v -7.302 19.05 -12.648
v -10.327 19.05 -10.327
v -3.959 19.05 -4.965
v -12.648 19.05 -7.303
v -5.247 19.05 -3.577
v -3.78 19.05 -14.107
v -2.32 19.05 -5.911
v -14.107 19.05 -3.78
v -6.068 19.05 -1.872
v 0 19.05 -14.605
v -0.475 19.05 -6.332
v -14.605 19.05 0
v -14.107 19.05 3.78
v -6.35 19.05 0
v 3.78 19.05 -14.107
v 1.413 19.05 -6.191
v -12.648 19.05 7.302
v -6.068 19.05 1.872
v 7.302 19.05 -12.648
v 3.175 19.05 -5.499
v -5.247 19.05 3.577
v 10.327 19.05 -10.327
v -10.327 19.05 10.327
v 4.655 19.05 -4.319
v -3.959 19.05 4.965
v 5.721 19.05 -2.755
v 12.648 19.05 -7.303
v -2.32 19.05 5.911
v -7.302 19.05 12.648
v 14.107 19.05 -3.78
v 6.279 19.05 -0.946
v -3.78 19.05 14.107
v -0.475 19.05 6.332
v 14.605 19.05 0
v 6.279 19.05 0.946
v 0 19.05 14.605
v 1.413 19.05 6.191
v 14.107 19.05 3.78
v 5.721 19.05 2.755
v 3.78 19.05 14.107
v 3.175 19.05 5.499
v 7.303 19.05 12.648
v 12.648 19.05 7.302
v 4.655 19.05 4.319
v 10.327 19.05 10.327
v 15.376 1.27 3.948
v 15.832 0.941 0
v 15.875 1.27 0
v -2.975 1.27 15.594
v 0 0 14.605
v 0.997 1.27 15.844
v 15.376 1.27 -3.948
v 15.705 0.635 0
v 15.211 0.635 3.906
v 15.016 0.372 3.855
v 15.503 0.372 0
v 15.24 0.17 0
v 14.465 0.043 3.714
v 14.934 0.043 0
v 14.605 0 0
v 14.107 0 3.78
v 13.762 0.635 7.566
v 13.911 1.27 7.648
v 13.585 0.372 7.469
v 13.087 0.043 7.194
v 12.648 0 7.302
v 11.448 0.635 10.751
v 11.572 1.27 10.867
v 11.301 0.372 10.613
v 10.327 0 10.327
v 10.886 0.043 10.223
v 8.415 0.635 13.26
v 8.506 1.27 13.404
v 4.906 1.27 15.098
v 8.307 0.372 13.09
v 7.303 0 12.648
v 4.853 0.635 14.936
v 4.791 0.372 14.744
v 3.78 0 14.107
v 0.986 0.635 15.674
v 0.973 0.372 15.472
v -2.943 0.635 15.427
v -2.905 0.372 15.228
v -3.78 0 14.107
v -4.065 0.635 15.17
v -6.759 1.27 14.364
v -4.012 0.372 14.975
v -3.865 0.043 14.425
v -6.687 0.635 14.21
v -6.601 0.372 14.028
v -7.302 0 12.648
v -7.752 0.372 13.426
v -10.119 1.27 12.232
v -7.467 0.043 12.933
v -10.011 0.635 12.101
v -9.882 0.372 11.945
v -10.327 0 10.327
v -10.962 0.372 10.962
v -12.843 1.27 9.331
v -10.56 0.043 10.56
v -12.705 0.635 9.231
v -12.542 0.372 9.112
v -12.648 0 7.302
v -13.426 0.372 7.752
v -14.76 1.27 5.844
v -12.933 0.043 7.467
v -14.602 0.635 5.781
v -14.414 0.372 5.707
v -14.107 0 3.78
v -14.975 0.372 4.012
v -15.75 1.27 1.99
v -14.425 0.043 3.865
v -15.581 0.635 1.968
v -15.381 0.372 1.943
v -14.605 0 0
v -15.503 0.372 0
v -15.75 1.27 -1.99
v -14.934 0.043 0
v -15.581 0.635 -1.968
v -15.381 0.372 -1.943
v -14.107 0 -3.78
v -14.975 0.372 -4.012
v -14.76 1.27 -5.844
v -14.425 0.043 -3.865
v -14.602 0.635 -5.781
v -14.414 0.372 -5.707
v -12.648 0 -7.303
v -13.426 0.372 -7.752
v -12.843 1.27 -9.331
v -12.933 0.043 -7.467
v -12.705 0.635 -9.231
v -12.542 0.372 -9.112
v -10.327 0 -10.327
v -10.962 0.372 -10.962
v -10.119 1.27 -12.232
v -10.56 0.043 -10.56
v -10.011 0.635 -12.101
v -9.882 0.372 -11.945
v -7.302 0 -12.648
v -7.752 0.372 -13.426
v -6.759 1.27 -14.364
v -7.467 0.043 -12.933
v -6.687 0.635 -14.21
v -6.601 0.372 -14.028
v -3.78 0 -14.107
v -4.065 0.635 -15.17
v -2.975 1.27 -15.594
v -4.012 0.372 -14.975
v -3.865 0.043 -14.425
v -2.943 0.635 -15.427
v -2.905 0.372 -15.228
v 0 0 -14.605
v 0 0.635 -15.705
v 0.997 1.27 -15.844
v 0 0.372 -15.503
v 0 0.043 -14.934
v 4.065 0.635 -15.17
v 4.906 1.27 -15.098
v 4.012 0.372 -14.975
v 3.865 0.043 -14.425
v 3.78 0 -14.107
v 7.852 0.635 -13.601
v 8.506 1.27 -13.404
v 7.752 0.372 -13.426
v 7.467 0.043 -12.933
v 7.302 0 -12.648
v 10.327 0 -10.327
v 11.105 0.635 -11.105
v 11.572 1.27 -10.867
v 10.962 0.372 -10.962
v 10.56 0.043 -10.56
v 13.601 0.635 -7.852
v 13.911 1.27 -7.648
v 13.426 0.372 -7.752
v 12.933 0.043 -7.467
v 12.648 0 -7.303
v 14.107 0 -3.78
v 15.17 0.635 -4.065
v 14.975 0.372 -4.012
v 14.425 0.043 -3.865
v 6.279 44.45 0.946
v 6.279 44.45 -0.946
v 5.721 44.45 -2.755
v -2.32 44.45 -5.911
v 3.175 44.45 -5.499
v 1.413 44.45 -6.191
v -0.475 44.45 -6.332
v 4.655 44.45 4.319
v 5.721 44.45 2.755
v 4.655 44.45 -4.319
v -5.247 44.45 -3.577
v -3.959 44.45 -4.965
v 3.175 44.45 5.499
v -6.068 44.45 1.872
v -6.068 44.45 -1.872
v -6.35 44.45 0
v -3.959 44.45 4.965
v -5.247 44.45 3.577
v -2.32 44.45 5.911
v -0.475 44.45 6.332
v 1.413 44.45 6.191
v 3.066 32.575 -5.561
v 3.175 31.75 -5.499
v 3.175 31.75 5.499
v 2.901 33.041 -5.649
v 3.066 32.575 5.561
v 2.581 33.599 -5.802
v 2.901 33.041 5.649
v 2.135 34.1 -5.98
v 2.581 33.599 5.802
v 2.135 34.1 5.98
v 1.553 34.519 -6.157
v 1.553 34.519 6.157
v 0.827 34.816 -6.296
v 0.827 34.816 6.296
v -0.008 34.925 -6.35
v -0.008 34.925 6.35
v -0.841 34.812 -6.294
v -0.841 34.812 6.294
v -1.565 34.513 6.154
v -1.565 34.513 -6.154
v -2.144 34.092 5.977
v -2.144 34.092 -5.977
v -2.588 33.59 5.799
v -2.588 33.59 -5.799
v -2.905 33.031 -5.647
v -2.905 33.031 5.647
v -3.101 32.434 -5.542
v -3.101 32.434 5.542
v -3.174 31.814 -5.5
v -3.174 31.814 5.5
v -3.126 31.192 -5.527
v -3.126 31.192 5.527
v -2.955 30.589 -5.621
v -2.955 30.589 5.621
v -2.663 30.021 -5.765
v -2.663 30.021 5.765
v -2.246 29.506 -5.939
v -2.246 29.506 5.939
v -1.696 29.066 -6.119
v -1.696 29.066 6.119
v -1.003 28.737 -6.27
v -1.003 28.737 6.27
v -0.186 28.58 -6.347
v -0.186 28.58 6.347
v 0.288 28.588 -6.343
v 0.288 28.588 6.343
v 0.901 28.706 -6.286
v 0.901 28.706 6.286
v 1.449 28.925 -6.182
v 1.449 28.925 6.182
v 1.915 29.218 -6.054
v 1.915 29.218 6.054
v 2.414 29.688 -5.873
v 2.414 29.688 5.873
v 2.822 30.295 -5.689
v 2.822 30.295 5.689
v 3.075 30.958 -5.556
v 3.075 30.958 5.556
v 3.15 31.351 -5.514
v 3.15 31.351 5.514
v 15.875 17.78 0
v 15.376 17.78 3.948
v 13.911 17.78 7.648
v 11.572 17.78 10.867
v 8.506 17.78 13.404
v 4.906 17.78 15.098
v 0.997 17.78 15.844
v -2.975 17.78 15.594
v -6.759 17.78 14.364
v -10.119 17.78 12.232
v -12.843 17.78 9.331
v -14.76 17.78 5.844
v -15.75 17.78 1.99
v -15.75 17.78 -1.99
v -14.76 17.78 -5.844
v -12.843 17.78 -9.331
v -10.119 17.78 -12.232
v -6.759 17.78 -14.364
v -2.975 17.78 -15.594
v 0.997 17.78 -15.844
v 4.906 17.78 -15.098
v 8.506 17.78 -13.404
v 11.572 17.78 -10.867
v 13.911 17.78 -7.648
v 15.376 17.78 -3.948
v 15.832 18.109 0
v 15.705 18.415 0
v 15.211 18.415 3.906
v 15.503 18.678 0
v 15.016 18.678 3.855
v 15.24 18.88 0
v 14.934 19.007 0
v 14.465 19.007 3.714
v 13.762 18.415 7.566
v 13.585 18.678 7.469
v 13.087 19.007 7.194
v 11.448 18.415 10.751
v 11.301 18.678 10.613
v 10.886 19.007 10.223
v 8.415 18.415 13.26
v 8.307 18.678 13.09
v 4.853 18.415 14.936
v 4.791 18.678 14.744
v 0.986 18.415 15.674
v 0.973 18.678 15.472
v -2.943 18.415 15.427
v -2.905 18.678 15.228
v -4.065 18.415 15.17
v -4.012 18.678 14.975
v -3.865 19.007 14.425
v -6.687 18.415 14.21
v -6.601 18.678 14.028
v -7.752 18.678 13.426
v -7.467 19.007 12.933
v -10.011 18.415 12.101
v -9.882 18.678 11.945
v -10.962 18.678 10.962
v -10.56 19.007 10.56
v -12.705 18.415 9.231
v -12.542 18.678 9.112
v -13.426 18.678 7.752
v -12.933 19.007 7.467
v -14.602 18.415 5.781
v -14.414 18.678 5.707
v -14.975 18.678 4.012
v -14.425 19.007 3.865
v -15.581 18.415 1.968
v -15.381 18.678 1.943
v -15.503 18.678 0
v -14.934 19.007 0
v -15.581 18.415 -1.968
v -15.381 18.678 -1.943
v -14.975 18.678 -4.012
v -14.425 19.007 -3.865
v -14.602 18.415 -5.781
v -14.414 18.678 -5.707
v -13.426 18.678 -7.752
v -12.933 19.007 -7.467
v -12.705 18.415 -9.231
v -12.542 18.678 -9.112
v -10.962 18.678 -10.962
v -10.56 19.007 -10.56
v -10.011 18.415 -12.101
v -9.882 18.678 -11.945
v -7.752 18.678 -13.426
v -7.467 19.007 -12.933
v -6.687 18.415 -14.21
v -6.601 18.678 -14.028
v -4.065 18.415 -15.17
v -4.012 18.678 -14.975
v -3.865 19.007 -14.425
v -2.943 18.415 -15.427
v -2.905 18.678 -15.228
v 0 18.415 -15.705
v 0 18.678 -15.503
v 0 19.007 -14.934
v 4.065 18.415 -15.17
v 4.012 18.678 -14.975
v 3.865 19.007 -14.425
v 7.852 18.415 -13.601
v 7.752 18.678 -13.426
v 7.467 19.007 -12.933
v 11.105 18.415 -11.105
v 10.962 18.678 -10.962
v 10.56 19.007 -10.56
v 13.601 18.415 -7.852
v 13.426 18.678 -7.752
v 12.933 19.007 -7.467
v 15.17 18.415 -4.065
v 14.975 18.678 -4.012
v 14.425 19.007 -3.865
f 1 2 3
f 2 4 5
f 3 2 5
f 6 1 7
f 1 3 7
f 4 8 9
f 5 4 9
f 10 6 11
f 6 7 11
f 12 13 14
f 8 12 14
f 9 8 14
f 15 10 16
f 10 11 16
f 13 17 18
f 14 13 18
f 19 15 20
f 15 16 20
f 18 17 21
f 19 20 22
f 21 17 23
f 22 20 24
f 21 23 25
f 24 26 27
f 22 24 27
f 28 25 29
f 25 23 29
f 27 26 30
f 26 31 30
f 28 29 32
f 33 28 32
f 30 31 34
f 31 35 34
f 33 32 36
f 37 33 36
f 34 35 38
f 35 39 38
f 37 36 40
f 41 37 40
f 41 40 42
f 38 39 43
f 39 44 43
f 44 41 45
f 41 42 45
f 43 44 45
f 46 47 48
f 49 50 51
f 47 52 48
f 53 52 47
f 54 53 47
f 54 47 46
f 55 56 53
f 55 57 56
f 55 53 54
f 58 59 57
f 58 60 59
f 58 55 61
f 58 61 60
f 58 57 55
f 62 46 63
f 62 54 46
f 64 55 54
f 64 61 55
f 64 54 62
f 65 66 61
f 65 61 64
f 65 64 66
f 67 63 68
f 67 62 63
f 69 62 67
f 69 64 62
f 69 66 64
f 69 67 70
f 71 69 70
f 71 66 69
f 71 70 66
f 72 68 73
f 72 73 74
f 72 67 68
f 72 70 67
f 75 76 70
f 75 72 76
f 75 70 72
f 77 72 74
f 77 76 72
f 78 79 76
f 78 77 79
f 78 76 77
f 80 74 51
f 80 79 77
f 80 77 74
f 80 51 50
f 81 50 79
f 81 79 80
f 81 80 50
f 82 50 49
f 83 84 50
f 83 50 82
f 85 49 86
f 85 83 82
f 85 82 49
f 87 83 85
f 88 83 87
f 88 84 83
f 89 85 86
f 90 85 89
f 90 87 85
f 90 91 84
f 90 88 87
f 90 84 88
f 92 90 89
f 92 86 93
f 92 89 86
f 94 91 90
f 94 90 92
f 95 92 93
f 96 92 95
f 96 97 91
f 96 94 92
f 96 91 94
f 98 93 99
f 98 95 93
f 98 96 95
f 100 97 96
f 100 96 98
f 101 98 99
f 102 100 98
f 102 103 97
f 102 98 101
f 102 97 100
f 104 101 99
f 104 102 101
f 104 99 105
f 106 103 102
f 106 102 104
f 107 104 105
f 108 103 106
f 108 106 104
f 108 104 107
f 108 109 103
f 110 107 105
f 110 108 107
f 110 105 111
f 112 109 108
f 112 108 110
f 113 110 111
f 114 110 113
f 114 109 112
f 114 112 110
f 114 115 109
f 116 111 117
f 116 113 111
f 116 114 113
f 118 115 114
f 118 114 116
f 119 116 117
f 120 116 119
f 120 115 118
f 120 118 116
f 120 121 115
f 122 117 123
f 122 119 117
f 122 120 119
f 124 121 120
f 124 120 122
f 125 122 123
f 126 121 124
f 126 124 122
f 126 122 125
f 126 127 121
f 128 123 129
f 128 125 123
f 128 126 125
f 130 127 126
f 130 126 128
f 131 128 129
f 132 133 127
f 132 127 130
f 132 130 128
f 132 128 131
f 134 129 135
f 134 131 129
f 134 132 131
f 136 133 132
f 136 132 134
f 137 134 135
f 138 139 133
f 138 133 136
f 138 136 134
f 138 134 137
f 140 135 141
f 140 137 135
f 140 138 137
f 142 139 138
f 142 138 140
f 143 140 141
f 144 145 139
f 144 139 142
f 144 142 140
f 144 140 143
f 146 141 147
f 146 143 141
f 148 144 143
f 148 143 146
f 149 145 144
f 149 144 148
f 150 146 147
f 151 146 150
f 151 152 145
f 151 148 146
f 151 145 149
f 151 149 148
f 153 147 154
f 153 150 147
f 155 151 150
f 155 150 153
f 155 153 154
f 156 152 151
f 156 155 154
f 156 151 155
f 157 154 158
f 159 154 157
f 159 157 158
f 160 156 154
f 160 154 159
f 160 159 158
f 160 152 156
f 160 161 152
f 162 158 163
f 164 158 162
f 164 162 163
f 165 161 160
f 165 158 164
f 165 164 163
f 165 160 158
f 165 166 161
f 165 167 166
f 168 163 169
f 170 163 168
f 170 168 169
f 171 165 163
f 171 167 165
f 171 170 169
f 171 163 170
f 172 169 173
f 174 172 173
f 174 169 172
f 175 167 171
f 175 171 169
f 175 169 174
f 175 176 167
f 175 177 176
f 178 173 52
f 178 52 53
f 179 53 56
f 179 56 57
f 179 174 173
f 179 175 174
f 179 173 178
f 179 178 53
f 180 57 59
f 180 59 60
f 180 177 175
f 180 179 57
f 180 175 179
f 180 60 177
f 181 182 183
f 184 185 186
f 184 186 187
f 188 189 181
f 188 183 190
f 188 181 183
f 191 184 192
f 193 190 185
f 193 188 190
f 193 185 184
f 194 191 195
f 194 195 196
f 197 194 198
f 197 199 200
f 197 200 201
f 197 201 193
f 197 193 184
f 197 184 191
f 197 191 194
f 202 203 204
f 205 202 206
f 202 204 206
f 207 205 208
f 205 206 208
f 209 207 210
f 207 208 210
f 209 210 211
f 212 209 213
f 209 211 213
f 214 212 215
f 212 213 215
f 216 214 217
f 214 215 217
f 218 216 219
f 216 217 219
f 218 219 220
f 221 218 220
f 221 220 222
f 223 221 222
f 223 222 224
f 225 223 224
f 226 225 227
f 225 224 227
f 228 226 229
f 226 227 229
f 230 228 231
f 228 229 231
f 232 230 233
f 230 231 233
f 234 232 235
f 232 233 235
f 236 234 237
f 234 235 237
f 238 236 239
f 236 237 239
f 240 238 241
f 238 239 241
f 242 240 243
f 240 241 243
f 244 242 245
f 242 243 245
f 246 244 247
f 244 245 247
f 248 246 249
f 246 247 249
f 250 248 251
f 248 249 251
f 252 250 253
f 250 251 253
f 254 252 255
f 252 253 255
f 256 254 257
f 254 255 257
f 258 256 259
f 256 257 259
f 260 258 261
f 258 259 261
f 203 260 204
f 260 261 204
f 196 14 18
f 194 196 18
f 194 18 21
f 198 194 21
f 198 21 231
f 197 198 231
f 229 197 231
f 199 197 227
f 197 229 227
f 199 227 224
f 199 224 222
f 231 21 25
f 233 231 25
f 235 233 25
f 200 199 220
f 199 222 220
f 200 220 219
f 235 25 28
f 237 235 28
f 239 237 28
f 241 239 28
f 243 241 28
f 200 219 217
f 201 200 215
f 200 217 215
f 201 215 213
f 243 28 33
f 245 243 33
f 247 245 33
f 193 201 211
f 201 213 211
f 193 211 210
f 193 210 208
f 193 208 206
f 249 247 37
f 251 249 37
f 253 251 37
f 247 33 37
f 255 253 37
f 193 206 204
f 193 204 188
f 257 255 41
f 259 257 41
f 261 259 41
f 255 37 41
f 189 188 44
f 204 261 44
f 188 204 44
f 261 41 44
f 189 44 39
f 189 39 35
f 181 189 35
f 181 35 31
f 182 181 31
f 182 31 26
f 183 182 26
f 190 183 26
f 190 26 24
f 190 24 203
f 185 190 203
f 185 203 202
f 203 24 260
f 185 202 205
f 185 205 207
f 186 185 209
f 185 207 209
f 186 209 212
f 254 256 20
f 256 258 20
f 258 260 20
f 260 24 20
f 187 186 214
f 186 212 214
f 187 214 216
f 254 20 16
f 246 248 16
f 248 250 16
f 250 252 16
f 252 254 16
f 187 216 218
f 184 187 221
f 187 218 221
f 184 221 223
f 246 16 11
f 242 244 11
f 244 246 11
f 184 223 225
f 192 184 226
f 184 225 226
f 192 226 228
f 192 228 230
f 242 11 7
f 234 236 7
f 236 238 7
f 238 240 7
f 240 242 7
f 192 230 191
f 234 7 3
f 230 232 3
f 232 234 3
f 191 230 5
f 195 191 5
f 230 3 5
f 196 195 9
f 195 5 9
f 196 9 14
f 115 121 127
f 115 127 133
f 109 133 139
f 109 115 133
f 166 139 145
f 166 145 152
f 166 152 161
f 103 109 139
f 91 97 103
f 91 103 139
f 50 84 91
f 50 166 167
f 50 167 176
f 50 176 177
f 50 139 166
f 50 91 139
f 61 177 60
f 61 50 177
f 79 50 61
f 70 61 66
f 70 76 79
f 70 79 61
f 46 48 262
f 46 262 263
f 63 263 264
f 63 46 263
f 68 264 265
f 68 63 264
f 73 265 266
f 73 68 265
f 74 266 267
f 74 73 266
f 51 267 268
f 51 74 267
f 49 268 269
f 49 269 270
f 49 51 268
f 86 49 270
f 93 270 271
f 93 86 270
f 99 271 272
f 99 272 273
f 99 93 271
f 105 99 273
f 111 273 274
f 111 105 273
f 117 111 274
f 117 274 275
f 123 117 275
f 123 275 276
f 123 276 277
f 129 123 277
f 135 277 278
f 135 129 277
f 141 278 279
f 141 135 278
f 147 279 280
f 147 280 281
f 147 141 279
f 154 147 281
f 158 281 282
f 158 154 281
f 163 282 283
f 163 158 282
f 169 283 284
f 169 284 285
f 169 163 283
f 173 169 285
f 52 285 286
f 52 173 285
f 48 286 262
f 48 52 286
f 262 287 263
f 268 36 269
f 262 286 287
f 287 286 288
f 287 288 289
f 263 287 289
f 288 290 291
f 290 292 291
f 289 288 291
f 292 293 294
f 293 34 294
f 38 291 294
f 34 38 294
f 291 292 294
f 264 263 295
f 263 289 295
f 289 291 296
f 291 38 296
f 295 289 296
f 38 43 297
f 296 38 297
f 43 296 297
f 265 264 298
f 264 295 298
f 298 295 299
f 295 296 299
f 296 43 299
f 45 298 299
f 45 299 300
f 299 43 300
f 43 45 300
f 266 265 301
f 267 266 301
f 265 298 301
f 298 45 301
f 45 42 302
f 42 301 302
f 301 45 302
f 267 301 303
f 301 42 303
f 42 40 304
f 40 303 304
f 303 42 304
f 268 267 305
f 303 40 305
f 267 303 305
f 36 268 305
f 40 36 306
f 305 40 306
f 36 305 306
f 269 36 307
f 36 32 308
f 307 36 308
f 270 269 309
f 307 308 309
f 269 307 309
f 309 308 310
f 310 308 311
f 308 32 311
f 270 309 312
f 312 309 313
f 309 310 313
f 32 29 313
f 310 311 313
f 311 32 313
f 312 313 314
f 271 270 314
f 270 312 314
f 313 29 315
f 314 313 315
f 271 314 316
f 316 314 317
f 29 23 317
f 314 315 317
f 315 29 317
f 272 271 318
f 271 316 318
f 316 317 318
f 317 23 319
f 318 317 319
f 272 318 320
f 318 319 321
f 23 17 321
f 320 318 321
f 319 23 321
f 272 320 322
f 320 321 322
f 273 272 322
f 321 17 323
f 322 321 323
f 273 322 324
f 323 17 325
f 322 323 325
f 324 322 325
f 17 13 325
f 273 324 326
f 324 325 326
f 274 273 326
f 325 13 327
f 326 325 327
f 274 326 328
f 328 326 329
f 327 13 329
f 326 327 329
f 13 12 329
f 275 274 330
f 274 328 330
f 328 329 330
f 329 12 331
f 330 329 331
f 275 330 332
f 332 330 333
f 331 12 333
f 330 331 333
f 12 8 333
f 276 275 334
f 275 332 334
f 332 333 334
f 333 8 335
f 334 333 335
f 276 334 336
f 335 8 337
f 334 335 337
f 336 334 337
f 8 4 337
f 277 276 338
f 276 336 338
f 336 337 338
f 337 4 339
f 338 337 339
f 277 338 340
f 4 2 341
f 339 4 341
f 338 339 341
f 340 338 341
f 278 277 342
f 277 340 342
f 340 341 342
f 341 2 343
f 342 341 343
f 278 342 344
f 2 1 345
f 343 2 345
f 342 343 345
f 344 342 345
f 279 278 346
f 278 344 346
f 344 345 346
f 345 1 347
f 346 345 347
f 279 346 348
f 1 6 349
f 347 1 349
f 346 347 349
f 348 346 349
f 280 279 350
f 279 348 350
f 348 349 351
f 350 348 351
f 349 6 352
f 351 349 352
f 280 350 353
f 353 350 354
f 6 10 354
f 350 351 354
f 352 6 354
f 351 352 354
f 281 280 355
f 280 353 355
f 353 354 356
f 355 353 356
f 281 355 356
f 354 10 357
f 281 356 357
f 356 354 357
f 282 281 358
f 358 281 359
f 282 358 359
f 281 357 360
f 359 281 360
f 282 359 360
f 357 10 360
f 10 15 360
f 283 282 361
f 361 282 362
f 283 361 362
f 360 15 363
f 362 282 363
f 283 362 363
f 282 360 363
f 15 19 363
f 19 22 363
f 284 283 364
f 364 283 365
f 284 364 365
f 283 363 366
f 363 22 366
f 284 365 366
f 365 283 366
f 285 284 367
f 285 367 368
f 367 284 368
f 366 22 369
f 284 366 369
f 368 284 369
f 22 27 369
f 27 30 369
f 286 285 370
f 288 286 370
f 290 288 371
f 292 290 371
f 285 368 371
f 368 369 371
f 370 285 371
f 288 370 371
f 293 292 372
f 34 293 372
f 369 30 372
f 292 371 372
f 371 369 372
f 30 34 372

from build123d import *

# Parameters (mm, degrees)
F0_R     = 15.875
F1_DEPTH = 19.05
F2_R     = 1.27
F3_R     = 6.35
F4_DEPTH = 25.4
F5_R     = 3.175
F6_DEPTH = 12.7


with BuildPart() as f1:
    # F0 (on Front) → F1 (new body)
    with BuildSketch(Plane.XZ):
        Circle(F0_R)
    extrude(amount=-F1_DEPTH)

    # F2
    f2_edges = [f1.edges().sort_by_distance(p)[0] for p in [
        (-15.875, 19.05, 0),
        (-15.875, 0, 0),
    ]]
    fillet(f2_edges, radius=F2_R)

    # F3 (on face) → F4 (join)
    with BuildSketch(Plane(origin=(0, 19.05, 0), x_dir=(-1, 0, 0), z_dir=(0, 1, 0))):
        Circle(F3_R)
    extrude(amount=F4_DEPTH)

    # F5 (on Top) → F6 (cut, symmetric)
    with BuildSketch(Plane.XY):
        with Locations((0, 31.75)):
            Circle(F5_R)
    extrude(amount=F6_DEPTH, both=True, mode=Mode.SUBTRACT)


solid = f1.part
